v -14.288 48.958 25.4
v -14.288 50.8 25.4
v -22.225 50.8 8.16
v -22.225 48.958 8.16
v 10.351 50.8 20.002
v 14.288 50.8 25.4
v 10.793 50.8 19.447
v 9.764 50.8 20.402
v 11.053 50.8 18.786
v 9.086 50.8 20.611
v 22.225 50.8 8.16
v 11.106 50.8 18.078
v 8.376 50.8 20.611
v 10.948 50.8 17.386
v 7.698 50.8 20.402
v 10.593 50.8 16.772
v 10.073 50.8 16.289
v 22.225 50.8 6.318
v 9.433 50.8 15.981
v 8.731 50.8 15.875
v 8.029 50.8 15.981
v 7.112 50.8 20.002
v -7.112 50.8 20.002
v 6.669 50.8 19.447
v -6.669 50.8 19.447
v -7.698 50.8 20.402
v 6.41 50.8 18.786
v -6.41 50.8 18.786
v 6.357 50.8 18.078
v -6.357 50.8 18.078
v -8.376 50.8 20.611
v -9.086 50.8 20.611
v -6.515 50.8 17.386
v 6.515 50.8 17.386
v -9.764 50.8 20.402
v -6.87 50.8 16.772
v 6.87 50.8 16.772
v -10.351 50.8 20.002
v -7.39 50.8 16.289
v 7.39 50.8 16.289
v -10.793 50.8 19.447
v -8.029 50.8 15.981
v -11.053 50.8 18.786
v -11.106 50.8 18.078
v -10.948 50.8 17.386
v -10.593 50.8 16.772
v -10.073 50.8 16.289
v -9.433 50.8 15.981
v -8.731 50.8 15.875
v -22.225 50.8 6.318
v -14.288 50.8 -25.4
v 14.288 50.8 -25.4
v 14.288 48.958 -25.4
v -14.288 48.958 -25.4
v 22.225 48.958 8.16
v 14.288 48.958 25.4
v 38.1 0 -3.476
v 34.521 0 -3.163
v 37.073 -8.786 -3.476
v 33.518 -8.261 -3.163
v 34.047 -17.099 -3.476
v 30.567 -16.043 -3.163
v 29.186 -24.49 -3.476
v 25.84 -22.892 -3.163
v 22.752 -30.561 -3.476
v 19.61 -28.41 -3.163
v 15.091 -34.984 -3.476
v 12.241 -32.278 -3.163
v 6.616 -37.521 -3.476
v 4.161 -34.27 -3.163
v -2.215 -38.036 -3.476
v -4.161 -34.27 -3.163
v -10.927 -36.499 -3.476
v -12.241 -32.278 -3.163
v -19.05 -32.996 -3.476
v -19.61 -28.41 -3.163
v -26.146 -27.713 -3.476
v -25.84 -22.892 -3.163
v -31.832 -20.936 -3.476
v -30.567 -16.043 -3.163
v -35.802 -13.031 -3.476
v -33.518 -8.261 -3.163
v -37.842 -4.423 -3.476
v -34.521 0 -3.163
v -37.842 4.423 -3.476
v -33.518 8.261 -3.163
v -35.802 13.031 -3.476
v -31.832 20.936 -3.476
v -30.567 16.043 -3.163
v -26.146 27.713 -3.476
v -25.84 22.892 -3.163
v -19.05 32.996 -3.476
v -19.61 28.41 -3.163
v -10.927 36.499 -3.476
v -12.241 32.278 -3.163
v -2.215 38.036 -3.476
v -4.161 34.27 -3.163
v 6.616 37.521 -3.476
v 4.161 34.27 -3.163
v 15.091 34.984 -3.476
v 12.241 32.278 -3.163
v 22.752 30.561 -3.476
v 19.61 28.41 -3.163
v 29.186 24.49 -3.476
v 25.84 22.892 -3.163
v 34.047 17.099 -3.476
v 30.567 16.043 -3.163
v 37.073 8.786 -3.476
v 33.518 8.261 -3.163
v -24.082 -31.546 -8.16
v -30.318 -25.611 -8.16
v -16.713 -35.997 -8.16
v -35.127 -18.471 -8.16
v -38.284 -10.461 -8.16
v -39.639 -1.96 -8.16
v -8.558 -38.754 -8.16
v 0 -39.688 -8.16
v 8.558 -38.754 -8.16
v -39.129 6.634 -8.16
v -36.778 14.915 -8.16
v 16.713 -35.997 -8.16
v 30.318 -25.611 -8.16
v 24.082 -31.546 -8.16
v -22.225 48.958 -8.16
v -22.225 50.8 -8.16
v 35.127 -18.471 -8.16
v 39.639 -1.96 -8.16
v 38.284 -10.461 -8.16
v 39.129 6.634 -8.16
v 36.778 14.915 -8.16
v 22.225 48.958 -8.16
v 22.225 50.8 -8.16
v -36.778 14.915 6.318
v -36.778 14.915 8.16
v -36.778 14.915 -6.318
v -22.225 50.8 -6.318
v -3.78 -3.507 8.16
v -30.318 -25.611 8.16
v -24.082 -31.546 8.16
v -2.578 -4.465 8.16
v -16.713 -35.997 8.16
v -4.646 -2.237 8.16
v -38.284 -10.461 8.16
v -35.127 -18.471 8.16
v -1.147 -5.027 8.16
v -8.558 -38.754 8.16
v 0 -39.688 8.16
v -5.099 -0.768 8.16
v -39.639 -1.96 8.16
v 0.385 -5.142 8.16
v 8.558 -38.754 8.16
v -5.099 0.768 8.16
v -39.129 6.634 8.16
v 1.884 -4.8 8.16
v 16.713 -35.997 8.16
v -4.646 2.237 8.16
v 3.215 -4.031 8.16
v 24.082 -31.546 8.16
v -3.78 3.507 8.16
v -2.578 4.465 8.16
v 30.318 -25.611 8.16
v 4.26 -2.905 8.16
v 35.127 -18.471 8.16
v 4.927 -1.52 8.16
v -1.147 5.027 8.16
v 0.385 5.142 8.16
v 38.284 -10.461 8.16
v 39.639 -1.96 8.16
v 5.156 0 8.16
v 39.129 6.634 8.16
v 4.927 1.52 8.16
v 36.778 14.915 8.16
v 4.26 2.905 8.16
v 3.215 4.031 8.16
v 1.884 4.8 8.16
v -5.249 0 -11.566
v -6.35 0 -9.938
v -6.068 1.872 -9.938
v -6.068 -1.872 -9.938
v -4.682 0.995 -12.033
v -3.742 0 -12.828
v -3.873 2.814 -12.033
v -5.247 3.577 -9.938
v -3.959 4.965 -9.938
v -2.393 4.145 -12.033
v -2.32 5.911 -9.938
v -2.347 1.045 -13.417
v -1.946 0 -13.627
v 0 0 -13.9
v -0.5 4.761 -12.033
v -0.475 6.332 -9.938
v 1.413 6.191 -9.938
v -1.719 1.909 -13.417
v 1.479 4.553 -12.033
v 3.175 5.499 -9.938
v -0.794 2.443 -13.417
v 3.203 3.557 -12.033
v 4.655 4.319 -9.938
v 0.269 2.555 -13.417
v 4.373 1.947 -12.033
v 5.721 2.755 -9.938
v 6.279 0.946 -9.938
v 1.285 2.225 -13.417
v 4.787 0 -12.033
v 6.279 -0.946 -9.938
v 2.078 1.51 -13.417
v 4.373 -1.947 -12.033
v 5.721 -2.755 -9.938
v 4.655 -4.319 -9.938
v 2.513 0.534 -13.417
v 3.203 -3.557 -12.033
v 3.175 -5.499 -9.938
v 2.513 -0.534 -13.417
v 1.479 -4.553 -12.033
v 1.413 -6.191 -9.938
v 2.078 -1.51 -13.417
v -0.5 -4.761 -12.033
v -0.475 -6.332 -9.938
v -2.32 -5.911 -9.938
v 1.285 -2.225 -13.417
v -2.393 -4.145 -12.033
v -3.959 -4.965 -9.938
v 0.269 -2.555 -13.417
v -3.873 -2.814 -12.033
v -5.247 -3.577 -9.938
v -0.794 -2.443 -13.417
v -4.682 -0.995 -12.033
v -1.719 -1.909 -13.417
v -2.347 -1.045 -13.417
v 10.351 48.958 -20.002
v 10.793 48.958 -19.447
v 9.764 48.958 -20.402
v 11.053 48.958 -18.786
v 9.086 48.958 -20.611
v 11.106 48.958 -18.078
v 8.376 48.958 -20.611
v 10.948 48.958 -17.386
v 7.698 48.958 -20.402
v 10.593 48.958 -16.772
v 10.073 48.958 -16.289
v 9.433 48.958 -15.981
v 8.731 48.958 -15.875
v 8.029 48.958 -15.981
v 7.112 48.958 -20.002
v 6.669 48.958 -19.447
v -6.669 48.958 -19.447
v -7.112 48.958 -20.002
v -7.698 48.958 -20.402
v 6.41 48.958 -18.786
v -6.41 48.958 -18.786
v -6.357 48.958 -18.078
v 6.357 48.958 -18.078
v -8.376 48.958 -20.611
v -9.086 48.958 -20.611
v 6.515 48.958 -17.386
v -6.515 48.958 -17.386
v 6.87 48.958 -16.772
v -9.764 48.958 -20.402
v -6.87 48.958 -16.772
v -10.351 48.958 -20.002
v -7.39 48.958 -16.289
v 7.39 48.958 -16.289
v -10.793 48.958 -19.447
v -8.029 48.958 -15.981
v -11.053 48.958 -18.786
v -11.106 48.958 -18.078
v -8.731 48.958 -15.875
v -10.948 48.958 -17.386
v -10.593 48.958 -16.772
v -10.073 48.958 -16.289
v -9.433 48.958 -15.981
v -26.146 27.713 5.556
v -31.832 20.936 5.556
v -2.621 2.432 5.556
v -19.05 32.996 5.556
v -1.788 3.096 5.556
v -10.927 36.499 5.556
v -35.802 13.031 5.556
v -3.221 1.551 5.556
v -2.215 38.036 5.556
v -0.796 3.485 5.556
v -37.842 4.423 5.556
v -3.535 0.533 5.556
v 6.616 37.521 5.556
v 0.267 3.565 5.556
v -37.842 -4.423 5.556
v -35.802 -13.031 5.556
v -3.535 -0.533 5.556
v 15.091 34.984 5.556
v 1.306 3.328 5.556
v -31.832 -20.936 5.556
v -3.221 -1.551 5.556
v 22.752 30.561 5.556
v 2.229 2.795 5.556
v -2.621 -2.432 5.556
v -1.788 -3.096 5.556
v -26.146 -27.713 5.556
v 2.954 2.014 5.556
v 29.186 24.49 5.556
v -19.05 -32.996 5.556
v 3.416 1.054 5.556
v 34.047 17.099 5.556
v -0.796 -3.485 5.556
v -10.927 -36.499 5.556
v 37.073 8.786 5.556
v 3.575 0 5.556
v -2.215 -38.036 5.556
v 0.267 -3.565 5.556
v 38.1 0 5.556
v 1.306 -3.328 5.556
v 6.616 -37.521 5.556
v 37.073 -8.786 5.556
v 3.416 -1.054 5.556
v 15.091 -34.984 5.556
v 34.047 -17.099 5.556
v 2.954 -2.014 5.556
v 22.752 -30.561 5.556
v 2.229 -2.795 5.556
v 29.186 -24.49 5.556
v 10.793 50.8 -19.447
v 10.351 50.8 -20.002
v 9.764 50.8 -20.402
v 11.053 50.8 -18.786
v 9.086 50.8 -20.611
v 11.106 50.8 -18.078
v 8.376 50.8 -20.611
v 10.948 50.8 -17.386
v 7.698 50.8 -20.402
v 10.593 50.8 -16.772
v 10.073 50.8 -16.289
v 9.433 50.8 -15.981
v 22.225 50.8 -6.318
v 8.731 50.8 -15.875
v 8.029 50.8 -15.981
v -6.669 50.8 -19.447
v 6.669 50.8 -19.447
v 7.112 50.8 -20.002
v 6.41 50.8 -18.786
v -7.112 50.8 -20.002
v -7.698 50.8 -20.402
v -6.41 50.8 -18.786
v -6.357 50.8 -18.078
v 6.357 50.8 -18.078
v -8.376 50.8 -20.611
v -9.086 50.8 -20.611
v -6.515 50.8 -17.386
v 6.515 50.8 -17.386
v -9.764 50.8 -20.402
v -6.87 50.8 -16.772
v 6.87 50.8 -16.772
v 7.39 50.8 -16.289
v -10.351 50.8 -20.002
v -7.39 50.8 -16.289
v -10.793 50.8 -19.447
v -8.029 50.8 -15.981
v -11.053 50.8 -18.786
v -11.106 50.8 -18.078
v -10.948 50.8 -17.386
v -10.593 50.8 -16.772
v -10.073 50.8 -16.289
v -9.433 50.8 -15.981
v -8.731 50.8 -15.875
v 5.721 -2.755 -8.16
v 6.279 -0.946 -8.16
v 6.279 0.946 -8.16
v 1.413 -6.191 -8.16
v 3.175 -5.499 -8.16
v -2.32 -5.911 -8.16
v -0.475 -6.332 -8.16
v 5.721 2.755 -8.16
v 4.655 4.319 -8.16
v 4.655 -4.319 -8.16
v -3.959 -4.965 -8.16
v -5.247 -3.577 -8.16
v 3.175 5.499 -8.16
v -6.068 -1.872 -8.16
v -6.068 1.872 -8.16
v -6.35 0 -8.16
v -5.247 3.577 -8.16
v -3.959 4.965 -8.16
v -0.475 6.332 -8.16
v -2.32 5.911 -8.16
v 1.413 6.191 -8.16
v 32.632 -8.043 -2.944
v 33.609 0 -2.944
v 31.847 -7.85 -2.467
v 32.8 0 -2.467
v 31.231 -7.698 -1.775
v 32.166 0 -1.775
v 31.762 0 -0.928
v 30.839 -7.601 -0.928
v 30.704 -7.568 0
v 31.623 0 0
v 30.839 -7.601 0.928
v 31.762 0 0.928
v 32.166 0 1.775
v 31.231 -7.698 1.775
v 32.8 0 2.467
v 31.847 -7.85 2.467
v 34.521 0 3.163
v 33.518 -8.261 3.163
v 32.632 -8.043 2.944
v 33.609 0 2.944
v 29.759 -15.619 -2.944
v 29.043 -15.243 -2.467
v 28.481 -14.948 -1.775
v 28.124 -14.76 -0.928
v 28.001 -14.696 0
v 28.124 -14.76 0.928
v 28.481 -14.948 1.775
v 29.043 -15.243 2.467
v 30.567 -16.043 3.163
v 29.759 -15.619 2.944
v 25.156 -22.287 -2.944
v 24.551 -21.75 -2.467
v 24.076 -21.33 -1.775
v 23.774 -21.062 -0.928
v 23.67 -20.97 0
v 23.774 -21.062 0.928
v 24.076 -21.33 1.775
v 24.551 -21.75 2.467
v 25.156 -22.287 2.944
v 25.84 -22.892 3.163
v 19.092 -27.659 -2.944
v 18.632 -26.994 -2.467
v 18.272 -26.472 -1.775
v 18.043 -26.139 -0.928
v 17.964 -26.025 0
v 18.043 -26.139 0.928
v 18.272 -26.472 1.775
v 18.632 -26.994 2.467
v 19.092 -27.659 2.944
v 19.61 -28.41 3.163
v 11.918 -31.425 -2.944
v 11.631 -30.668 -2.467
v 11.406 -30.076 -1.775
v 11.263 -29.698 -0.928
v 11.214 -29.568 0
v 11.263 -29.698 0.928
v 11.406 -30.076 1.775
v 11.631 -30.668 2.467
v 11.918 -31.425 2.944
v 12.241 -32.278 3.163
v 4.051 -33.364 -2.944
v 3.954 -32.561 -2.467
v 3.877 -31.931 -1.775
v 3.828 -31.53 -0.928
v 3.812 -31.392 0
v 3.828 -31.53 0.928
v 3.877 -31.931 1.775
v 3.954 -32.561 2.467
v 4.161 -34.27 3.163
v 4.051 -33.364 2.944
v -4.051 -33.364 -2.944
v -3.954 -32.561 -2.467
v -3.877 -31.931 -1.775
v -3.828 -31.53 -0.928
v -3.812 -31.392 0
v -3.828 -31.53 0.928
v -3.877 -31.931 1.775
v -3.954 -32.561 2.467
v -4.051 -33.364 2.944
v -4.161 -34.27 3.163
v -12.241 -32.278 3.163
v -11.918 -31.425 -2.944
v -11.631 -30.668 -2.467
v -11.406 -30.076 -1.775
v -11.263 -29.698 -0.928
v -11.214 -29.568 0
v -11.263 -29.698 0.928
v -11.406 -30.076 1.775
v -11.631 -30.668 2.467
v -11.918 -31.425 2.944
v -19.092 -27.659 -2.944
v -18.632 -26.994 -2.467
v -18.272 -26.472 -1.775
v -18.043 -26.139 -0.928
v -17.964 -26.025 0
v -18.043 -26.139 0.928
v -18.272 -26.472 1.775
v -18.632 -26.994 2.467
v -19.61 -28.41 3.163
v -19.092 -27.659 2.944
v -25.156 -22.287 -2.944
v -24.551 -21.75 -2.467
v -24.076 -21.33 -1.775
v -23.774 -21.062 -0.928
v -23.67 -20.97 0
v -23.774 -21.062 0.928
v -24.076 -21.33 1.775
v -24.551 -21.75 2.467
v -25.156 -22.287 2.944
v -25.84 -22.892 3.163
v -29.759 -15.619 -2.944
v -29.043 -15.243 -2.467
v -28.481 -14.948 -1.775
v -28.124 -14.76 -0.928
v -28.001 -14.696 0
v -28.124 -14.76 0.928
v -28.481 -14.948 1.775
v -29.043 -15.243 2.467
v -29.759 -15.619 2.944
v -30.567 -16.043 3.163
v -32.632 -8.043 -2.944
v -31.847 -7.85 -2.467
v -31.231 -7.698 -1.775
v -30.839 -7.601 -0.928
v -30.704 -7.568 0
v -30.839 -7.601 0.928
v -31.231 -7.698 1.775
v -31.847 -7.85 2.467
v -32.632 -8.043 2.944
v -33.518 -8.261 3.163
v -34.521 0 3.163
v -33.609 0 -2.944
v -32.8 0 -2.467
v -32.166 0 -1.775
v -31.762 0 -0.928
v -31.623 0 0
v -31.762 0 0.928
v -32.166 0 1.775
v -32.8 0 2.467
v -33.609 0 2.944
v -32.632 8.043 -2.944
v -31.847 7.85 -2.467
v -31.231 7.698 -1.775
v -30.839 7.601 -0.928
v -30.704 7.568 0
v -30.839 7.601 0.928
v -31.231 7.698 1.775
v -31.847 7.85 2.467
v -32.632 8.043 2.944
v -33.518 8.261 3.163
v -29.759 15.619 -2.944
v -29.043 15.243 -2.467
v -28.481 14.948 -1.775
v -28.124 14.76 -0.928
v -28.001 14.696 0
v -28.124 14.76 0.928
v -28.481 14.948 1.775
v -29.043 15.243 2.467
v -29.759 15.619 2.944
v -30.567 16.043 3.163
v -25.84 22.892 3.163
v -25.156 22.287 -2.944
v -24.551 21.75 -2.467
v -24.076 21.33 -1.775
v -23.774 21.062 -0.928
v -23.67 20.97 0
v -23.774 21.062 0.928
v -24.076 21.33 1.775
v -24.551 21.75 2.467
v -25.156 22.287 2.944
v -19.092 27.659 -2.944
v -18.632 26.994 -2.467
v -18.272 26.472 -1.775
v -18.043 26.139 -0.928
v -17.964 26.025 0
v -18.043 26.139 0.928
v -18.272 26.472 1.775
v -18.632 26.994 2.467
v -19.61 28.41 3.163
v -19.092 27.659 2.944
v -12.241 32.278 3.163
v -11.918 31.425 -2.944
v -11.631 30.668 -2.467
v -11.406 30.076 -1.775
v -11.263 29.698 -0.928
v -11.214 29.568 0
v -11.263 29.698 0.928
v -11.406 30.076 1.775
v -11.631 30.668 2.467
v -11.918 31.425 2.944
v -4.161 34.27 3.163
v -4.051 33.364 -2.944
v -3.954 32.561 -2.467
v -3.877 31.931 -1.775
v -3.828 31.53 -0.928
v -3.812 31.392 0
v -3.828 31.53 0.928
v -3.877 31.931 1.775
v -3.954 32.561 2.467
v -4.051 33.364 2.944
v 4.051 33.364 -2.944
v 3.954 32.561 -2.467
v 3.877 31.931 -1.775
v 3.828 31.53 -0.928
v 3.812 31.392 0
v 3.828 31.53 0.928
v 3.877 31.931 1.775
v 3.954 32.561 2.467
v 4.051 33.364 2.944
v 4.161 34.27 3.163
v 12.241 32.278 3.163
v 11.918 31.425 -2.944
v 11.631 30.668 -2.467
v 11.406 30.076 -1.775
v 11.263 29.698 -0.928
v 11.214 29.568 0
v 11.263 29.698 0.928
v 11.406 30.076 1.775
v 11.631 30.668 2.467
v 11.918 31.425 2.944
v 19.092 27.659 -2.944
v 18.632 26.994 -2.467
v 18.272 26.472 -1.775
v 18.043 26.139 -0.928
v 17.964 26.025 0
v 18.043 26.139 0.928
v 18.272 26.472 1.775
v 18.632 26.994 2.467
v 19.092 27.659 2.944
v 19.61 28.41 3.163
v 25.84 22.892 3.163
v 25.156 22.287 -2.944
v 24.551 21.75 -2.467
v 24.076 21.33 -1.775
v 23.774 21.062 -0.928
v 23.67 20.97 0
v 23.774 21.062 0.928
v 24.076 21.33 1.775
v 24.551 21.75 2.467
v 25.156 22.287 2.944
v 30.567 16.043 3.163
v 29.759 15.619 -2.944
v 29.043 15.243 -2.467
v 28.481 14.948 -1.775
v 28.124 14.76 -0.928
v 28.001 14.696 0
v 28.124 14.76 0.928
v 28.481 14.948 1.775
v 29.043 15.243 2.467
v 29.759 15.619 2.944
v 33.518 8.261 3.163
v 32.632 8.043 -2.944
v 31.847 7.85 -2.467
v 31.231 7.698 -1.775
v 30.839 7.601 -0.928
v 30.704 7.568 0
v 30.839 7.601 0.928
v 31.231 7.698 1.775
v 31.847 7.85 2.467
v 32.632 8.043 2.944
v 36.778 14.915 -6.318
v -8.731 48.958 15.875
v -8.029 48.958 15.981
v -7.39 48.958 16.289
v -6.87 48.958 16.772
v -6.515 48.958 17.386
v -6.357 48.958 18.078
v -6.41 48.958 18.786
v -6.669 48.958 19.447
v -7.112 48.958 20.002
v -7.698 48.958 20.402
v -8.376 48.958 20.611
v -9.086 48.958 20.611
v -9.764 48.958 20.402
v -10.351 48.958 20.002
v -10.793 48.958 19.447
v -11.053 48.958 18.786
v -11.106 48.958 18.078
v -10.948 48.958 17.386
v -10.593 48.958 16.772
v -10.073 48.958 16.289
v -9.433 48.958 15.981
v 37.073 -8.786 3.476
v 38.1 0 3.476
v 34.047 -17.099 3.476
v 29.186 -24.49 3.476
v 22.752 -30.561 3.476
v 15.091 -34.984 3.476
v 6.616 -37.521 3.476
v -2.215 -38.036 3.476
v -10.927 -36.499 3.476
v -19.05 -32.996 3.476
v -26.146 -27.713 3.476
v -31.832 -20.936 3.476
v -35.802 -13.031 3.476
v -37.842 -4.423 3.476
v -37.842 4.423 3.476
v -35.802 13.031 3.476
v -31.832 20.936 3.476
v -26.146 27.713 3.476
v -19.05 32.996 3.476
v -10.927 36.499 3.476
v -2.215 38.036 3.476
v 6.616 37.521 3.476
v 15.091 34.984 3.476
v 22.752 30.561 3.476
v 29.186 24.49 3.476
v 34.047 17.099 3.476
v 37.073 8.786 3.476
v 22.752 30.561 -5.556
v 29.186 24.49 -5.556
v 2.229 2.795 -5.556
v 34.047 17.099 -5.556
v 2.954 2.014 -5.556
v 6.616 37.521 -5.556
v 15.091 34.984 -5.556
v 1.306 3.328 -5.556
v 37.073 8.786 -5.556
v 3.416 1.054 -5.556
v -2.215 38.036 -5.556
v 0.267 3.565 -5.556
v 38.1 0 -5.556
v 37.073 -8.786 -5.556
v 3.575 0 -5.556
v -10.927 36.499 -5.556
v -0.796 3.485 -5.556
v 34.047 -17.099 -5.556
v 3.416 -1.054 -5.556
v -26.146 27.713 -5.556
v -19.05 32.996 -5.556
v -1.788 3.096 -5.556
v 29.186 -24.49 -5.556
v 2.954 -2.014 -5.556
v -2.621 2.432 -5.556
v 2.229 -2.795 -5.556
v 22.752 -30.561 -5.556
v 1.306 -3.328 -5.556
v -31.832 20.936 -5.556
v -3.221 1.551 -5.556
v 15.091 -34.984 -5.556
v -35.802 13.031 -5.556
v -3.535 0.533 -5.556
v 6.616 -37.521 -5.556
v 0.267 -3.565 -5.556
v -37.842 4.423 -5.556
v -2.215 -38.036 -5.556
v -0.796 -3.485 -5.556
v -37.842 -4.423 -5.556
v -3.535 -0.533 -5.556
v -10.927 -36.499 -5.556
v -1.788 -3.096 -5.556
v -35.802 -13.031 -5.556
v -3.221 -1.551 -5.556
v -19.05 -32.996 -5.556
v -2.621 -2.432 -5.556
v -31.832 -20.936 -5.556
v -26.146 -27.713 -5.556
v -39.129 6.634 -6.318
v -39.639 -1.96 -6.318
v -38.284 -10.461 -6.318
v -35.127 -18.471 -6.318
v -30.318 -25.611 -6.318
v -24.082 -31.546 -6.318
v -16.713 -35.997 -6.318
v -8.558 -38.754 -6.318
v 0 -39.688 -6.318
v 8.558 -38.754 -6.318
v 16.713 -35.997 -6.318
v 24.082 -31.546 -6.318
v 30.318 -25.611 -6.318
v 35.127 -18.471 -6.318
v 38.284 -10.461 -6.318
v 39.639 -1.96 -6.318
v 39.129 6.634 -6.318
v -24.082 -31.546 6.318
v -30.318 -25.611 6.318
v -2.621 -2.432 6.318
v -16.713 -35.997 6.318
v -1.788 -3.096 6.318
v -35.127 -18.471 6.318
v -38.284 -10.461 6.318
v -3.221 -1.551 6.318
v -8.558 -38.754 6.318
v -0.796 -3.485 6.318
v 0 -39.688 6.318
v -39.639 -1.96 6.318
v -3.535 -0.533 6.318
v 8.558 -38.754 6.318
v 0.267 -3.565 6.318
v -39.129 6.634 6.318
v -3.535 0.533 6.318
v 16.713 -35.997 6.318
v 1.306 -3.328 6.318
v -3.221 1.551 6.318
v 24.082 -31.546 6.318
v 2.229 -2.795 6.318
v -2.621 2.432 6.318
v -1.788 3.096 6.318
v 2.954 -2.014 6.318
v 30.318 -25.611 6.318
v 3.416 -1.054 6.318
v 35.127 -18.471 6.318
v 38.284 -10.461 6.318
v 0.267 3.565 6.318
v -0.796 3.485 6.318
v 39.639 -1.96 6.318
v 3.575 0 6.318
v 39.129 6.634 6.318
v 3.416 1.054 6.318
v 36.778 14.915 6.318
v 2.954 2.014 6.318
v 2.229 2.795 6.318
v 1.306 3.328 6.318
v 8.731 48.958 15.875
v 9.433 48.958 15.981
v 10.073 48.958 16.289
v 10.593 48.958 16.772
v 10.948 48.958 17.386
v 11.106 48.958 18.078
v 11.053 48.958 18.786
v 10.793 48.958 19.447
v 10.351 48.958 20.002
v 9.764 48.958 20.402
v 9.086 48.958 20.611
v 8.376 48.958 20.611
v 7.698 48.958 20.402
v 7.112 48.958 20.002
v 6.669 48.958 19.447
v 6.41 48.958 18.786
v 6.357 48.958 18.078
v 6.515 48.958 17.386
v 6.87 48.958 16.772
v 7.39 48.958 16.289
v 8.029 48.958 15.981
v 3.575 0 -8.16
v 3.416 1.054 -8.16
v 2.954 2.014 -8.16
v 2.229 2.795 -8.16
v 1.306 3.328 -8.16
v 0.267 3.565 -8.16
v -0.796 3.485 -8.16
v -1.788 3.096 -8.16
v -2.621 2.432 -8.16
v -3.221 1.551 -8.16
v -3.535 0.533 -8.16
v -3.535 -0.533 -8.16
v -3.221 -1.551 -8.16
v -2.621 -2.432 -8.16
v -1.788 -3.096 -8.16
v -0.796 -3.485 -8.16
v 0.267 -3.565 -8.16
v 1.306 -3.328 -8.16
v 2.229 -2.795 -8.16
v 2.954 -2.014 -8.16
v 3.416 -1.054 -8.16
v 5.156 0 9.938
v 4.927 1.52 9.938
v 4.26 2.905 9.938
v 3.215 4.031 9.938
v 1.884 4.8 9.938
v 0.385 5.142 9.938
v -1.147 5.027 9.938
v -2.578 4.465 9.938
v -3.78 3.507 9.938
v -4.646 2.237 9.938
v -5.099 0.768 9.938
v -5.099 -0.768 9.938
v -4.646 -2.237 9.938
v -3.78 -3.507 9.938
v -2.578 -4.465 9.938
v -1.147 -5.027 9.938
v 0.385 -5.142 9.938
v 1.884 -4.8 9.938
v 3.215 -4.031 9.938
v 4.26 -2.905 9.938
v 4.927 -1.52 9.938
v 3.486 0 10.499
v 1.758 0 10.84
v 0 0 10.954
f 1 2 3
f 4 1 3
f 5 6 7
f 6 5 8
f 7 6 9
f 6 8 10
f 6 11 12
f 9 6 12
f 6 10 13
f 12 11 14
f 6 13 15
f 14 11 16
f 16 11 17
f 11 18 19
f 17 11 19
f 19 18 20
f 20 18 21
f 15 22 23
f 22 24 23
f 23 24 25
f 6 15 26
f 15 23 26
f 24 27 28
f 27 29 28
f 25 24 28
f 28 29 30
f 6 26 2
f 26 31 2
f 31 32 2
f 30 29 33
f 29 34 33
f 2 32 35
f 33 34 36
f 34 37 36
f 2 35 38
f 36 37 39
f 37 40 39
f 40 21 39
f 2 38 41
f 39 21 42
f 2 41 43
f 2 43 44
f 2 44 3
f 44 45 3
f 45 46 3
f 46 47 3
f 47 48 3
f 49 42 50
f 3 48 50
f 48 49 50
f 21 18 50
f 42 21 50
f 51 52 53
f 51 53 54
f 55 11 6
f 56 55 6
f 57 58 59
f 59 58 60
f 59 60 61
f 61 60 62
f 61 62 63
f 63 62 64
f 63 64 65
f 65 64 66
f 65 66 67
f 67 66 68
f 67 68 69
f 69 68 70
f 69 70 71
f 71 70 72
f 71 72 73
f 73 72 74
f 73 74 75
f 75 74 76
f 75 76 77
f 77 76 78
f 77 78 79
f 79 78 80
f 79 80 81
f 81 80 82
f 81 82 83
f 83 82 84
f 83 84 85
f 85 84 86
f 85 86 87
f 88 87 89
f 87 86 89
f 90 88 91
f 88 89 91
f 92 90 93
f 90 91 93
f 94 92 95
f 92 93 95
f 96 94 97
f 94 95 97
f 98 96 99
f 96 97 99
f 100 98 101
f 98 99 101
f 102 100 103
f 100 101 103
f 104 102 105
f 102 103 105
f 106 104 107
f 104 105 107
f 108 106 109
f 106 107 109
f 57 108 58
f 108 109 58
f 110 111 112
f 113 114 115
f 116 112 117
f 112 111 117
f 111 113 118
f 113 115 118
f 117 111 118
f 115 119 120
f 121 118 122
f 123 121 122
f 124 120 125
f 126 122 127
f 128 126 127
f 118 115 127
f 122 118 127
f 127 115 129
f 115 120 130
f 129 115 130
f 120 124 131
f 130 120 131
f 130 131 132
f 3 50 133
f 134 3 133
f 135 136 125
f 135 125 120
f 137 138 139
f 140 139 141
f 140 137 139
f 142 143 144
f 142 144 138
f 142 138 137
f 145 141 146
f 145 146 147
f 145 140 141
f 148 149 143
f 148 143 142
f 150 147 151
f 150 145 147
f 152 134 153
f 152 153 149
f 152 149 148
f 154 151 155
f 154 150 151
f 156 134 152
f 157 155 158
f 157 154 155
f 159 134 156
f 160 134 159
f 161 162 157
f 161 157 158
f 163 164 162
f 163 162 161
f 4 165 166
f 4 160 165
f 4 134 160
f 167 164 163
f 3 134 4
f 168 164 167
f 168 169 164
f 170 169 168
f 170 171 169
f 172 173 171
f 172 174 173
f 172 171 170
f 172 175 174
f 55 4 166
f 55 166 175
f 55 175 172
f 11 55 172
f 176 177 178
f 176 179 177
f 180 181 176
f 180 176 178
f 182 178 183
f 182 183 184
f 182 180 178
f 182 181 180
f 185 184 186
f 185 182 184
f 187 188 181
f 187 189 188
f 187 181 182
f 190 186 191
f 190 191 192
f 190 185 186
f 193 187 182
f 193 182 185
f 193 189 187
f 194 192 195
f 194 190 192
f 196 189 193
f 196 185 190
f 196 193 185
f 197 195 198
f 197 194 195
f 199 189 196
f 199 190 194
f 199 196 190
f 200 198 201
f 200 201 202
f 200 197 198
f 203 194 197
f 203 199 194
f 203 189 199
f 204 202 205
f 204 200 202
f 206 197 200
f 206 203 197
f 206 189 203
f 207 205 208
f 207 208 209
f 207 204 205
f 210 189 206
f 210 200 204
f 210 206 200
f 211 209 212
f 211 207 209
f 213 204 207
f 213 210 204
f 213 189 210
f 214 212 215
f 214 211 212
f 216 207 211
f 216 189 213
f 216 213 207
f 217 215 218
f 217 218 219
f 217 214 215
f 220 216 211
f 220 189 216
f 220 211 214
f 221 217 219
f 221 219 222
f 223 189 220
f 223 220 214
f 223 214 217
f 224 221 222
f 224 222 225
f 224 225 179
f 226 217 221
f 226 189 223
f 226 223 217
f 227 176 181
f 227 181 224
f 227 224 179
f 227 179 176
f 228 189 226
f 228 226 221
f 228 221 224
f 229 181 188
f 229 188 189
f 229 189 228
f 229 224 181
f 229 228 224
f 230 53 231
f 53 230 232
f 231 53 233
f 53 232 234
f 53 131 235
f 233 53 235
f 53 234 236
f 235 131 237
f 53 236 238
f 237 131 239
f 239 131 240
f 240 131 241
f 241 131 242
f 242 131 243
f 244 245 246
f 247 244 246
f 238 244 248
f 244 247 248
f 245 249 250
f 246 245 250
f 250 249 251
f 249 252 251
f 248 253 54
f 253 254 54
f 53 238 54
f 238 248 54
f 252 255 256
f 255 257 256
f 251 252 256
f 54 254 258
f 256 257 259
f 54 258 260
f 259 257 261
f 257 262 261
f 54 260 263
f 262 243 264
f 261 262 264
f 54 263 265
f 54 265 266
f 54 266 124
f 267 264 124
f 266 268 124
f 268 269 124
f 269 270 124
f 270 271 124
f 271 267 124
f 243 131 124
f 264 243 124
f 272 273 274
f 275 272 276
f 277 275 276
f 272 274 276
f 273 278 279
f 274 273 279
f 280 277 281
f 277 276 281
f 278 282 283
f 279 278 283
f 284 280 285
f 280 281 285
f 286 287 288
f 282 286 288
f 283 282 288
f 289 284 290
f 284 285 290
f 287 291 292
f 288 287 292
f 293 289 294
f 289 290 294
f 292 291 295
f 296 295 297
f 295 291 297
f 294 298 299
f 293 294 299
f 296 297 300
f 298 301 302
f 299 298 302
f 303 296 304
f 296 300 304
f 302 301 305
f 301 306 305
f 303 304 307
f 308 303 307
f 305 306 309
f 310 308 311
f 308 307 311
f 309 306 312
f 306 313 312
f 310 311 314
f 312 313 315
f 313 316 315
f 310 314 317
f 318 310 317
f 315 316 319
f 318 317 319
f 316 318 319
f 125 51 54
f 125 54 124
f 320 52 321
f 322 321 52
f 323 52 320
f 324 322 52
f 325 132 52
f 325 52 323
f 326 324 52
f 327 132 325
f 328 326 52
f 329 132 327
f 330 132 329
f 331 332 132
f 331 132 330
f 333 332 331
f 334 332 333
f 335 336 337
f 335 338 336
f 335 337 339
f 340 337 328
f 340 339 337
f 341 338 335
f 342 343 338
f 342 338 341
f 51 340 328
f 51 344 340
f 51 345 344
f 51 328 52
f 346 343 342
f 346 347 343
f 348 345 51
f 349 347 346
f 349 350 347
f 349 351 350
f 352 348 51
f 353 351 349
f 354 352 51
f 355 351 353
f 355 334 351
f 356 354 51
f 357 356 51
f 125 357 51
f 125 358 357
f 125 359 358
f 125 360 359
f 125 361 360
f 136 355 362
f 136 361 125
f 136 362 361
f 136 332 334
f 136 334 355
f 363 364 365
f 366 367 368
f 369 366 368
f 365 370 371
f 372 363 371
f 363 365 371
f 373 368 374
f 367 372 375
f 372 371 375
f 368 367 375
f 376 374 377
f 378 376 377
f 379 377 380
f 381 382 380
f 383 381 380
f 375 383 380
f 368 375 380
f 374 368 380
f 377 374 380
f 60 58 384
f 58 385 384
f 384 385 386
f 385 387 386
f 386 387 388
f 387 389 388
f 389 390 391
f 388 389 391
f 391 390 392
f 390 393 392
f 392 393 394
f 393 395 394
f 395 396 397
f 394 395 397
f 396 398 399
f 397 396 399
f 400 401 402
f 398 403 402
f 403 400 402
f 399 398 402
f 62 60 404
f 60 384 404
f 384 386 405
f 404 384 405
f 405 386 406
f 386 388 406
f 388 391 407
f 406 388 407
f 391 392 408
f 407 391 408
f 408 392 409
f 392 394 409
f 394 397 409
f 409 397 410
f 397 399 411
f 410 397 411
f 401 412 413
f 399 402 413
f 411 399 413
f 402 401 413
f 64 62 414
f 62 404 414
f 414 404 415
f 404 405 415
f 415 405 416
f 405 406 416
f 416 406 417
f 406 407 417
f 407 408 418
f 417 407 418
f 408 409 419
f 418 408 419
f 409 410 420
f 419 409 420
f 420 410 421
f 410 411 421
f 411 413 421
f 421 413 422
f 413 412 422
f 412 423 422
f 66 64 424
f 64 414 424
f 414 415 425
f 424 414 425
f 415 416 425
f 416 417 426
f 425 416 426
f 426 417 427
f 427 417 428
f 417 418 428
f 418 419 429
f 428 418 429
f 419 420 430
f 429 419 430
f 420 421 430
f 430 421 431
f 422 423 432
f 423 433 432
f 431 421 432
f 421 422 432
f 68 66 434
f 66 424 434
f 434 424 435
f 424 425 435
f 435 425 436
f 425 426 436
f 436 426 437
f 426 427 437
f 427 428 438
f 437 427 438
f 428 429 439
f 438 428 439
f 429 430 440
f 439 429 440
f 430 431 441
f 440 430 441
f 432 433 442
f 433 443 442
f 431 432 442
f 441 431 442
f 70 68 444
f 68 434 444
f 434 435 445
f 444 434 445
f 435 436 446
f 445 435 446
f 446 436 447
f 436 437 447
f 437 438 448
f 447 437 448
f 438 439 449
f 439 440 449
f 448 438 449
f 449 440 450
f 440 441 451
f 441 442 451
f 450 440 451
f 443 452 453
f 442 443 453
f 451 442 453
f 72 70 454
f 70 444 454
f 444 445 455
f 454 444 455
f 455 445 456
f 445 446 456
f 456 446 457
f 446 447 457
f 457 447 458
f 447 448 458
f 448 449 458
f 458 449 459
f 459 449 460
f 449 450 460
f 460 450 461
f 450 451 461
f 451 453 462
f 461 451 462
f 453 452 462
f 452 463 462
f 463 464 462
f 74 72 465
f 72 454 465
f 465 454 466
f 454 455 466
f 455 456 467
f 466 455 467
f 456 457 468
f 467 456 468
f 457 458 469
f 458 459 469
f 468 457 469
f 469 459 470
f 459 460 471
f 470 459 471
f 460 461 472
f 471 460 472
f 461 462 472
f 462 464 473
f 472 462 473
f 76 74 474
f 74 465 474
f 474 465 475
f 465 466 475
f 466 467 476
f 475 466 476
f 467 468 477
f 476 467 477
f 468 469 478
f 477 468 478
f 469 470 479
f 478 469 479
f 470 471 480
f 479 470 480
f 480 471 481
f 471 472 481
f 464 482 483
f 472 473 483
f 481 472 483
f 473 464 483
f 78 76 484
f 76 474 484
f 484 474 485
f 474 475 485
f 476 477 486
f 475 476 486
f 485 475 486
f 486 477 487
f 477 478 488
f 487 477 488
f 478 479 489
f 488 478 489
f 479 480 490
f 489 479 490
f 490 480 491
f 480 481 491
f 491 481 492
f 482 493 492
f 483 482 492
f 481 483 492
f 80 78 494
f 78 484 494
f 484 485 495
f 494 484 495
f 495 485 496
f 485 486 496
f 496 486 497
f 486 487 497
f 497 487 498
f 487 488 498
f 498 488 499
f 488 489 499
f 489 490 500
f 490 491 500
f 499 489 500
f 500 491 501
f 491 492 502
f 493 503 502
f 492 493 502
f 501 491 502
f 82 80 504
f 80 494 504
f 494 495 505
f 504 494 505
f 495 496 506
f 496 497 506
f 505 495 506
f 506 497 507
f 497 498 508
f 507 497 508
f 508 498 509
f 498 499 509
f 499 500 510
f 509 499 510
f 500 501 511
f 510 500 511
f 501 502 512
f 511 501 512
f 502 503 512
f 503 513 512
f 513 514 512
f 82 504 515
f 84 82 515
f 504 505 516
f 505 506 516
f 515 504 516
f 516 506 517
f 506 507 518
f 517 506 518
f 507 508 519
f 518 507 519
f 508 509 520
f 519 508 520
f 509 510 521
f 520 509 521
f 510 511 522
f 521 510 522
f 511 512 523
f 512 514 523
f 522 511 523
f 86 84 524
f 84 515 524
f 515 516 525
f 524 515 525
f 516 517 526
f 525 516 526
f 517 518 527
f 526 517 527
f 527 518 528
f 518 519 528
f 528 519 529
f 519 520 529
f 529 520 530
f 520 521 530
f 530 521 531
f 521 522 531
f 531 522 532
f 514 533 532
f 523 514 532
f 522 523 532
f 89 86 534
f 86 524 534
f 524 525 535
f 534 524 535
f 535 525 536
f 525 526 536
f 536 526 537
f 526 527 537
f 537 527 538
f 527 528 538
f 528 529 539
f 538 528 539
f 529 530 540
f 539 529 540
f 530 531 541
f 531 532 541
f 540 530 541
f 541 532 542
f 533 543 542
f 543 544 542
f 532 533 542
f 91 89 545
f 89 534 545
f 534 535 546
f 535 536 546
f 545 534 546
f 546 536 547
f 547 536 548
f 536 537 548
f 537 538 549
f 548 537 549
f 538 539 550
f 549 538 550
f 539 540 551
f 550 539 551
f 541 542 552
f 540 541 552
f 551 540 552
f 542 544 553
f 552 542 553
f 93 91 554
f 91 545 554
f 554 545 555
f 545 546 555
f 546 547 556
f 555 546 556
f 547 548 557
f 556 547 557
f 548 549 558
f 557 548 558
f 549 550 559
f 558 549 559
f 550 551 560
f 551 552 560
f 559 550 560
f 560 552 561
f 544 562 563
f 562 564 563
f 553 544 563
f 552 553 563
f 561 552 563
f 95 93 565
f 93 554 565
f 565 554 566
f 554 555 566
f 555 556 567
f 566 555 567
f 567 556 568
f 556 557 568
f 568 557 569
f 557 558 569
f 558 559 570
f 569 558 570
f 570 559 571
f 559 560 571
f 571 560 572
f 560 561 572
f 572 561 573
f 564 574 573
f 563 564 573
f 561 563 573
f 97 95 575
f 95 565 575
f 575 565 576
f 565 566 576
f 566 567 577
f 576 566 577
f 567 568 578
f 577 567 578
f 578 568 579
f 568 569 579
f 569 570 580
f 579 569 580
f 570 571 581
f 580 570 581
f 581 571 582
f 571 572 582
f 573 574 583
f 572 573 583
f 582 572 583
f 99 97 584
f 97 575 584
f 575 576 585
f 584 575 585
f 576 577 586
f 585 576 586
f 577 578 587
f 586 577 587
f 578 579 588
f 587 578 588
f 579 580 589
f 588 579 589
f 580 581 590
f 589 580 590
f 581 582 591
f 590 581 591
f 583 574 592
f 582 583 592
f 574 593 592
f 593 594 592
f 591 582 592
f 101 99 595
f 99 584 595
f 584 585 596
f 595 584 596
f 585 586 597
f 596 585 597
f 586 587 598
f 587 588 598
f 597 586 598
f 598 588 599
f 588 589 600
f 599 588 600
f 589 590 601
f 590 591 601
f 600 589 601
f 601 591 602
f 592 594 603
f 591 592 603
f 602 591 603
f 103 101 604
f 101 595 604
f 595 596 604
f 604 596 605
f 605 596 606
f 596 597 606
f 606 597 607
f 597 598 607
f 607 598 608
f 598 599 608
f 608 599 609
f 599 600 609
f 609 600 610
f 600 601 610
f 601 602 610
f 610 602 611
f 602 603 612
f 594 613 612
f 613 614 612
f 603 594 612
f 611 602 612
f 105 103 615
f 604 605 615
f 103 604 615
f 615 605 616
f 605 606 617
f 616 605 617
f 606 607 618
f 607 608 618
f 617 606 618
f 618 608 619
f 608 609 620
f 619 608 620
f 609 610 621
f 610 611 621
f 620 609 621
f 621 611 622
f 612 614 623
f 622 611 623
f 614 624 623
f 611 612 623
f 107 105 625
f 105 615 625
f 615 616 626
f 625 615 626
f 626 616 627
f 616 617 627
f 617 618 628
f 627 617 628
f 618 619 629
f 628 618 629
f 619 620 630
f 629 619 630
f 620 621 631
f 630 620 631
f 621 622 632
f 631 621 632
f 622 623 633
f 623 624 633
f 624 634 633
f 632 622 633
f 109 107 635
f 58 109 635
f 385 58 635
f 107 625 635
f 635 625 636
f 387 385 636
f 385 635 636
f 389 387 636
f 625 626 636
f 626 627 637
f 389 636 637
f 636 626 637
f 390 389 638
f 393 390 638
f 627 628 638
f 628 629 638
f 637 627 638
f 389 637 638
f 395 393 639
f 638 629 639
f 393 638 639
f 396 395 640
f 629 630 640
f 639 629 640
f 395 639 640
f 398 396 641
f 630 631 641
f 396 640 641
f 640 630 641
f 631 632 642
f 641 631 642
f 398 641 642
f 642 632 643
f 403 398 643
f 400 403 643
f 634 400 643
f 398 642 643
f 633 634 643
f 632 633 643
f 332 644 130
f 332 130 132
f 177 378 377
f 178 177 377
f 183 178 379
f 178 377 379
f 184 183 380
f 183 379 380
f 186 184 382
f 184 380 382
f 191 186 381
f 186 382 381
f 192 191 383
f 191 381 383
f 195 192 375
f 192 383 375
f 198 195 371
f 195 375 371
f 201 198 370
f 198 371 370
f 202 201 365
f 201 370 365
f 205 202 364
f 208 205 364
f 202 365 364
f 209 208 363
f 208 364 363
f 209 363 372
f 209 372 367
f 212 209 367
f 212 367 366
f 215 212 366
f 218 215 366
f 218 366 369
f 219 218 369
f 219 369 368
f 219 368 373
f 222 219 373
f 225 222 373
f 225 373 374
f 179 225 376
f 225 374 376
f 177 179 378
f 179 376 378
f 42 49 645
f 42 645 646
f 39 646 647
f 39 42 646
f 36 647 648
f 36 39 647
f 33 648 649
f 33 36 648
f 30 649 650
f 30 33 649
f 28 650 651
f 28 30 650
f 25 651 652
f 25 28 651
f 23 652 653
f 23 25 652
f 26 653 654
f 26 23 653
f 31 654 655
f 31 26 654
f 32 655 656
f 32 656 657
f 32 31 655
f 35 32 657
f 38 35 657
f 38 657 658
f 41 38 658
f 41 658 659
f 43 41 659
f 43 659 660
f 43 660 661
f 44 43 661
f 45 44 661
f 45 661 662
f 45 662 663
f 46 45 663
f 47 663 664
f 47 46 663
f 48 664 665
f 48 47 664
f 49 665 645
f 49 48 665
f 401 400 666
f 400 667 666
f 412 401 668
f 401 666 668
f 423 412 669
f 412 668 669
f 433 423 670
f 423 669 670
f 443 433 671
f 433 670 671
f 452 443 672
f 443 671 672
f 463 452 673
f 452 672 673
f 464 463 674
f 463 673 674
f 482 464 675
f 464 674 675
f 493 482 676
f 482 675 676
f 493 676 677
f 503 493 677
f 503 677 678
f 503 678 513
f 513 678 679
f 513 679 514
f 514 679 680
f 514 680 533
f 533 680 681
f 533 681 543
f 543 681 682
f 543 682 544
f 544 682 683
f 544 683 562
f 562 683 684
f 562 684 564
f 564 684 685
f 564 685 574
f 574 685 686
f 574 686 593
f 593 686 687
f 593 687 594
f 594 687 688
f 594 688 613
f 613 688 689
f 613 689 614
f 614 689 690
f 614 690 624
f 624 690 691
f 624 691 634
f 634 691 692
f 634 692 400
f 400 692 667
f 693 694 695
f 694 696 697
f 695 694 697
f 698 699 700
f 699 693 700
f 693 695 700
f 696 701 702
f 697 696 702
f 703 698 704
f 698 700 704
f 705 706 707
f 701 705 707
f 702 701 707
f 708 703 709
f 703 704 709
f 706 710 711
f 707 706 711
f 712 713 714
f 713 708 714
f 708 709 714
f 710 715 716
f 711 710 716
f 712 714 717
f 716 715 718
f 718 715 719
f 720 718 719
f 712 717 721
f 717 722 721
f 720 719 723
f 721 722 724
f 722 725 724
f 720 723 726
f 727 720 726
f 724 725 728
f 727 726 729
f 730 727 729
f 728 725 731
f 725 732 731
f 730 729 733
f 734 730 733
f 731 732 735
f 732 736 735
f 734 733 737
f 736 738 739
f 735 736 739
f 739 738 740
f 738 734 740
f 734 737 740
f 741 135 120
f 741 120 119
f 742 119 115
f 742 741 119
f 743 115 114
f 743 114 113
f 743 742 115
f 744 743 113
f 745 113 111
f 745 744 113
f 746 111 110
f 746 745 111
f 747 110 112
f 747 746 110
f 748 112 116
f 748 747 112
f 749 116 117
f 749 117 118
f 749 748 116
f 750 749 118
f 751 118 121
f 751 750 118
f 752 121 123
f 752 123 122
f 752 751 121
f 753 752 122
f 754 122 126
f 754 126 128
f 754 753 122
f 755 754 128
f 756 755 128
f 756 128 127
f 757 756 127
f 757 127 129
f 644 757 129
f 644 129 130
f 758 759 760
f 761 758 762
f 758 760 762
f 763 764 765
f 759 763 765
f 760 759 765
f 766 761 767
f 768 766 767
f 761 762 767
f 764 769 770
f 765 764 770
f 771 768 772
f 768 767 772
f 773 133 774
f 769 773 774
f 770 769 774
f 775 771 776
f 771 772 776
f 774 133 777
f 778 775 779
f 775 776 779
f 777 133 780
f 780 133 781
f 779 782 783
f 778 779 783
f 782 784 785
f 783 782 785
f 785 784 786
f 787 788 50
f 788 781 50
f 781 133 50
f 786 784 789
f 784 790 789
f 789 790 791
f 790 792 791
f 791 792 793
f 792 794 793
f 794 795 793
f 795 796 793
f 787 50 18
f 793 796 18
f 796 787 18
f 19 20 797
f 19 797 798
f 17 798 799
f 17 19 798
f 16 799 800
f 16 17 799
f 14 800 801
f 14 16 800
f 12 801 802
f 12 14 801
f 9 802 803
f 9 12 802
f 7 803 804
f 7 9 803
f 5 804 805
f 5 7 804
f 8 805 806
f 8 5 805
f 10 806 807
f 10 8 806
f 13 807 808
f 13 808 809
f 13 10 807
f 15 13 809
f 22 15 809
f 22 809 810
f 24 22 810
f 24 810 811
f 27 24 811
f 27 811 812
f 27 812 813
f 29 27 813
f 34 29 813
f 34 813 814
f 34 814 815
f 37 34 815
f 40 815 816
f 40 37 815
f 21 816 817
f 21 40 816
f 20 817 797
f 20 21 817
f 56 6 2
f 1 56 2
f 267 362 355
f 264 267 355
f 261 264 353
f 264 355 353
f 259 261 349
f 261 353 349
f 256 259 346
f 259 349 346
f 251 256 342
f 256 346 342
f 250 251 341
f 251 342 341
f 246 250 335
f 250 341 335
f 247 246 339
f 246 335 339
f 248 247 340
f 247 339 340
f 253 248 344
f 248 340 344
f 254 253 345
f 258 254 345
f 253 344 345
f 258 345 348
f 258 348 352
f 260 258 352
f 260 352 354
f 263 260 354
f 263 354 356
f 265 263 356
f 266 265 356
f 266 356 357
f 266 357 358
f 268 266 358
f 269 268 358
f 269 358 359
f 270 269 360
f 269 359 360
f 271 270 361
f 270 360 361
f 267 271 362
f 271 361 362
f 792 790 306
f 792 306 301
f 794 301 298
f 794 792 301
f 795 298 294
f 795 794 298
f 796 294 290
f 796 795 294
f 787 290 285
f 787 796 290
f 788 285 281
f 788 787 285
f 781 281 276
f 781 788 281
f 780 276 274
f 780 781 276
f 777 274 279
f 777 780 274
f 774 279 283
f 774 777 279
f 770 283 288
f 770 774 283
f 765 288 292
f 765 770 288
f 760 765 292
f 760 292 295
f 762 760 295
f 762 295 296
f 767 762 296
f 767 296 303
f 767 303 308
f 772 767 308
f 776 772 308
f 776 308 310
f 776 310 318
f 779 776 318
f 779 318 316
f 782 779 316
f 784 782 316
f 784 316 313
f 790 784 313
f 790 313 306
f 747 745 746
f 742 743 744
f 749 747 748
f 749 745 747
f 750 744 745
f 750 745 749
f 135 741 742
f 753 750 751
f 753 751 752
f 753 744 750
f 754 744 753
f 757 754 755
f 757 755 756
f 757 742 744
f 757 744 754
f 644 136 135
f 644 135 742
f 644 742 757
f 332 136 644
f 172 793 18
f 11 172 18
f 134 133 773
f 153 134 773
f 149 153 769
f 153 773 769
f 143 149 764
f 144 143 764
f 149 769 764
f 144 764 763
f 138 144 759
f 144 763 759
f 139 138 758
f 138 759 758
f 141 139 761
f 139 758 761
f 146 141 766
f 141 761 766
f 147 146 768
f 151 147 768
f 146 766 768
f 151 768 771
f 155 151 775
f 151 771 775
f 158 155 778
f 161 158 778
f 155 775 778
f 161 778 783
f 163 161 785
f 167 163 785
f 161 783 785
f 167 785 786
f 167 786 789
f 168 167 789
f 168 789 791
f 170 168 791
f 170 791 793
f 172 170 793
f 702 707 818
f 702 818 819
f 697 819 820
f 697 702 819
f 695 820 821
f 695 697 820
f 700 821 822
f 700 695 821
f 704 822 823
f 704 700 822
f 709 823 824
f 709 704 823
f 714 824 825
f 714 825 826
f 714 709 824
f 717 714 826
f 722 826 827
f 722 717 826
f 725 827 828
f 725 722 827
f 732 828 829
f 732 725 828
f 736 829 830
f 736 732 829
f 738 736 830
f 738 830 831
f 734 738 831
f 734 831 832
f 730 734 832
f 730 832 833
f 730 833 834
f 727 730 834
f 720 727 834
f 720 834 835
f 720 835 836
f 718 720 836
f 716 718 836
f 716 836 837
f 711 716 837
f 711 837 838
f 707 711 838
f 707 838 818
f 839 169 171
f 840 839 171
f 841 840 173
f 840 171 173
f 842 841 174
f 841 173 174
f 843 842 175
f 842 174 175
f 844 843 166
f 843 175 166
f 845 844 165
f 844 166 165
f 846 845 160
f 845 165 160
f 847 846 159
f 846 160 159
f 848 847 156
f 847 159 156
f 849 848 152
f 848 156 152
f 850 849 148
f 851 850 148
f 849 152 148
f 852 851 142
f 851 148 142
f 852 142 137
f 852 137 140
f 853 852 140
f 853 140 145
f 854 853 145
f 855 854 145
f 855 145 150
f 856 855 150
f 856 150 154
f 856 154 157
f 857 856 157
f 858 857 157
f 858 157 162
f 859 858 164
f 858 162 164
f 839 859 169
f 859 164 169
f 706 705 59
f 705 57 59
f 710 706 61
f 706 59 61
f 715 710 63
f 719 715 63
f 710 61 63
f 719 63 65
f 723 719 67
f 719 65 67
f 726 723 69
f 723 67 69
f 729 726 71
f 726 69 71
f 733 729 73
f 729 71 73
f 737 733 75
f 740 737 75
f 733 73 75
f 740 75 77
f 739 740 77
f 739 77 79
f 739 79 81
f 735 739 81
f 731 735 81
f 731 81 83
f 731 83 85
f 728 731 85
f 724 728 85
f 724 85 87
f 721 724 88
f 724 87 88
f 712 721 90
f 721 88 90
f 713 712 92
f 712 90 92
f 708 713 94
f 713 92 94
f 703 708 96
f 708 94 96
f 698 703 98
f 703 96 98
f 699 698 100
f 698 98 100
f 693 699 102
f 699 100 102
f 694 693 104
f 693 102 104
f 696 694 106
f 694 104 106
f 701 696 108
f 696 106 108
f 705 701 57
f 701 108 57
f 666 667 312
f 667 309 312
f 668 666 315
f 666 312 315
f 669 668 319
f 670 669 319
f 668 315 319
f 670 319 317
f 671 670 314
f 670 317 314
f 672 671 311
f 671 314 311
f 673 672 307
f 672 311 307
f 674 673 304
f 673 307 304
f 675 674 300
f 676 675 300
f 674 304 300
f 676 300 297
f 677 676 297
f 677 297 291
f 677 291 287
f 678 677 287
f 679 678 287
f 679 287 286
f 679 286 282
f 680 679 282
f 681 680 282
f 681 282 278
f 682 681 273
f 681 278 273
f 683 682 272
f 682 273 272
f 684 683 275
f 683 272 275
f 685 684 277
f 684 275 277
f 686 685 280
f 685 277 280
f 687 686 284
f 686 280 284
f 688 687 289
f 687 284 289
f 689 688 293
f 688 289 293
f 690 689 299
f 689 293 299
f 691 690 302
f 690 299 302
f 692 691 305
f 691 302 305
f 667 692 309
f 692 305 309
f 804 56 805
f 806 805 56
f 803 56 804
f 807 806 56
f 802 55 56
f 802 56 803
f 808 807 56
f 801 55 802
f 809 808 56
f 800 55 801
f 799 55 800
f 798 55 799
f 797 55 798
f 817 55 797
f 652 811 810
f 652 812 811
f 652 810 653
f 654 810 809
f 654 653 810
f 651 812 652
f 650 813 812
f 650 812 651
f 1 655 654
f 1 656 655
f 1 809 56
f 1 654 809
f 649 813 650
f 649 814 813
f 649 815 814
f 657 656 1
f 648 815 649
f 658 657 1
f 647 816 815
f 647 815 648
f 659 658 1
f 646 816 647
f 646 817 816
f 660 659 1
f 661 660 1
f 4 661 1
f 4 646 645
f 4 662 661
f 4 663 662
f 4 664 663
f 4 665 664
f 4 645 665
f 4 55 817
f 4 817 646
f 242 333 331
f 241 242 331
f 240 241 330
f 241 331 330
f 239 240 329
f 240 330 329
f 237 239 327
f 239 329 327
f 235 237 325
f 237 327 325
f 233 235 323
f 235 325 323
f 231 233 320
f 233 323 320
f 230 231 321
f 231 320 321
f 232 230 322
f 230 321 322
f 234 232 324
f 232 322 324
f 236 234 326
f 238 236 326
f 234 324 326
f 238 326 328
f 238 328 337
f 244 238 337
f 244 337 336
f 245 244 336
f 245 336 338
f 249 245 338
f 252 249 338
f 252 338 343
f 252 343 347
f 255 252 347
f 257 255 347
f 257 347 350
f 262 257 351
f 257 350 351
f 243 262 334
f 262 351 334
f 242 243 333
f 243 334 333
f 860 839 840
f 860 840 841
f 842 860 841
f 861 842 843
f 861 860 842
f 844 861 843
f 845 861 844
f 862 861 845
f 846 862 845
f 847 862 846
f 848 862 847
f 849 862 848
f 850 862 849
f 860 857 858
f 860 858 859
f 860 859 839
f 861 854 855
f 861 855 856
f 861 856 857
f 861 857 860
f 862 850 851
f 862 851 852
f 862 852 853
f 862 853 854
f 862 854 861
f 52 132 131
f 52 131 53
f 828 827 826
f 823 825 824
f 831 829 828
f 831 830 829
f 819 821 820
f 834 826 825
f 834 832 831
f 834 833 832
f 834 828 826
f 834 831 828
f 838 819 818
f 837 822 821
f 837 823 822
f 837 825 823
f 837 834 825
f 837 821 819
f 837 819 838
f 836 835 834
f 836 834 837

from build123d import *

# Parameters (mm, degrees)
BOSS_EXTRUDE1_DEPTH = 1.8415
SKETCH5_R           = 2.38125
BOSS_EXTRUDE2_DEPTH = 1.8415
SKETCH6_R           = 5.1562
BOSS_EXTRUDE3_DEPTH = 1.778
DOME4_FACE_RADIUS   = 5.1562
DOME4_HEIGHT        = 1.016
SKETCH8_R           = 6.35
BOSS_EXTRUDE4_DEPTH = 1.778
DOME7_FACE_RADIUS   = 6.35
DOME7_HEIGHT        = 3.9624
BOSS_EXTRUDE5_REACH = 74.677
SKETCH9_R           = 3.57505


with BuildPart() as part:
    # Sketch3 → Revolve1 (revolve)
    with BuildSketch(Plane(origin=(0, 0, 0), x_dir=(0, 0, -1), z_dir=(1, 0, 0)), mode=Mode.PRIVATE) as revolve1_sk:
        with BuildLine():
            Line((-5.55625, 38.1), (-5.55625, 0))
            Line((-5.55625, 0), (5.55625, 0))
            Line((5.55625, 0), (5.55625, 38.1))
            Line((5.55625, 38.1), (3.476015551, 38.1))
            Line((3.476015551, 38.1), (3.162918166, 34.521280517))
            ThreePointArc((3.162918166, 34.521280517), (0, 31.623), (-3.162918166, 34.521280517))
            Line((-3.162918166, 34.521280517), (-3.476015551, 38.1))
            Line((-3.476015551, 38.1), (-5.55625, 38.1))
        make_face()
    revolve(revolve1_sk.sketch.rotate(Axis((0, 0, 5.55625), (0, 0, -1)), 90), axis=Axis((0, 0, 5.55625), (0, 0, -1)))



with BuildPart() as body_2:
    # Sketch4 → Boss-Extrude1 (new body)
    with BuildSketch(Plane.XY.offset(6.31825)):
        with BuildLine():
            Line((22.225, 50.8), (-22.225, 50.8))
            Line((-22.225, 50.8), (-36.778077648, 14.915450404))
            ThreePointArc((-36.778077648, 14.915450404), (0, -39.6875), (36.778077648, 14.915450404))
            Line((36.778077648, 14.915450404), (22.225, 50.8))
        make_face()
    extrude(amount=BOSS_EXTRUDE1_DEPTH)

    # Sketch5 → Boss-Extrude2 (add)
    with BuildSketch(Plane(origin=(0, 50.8, 97.5995), x_dir=(-1, 0, 0), z_dir=(0, -1, 0))):
        Polygon((-14.2875, 72.1995), (14.2875, 72.1995), (22.225, 89.43975), (-22.225, 89.43975), align=None)
        with Locations(Location((-8.73125, 79.34325, 0), (0, 0, 90))):
            Circle(SKETCH5_R, mode=Mode.SUBTRACT)
        with Locations(Location((8.73125, 79.34325, 0), (0, 0, 90))):
            Circle(SKETCH5_R, mode=Mode.SUBTRACT)
    extrude(amount=BOSS_EXTRUDE2_DEPTH)


with BuildPart() as body_3:
    # Mirror1: mirrored copy
    add(body_2.part.mirror(Plane.XY))


with BuildPart() as body_2_1:
    add(body_2.part)

    # Sketch6 → Boss-Extrude3 (add)
    with BuildSketch(Plane.XY.offset(8.15975)):
        Circle(SKETCH6_R)
    extrude(amount=BOSS_EXTRUDE3_DEPTH)

    # Dome4: a dome of height H over a round flat face of radius A is a cap of a sphere of radius (A * A + H * H) / (2 * H)
    dome4_r = (DOME4_FACE_RADIUS * DOME4_FACE_RADIUS + DOME4_HEIGHT * DOME4_HEIGHT) / (2 * DOME4_HEIGHT)
    dome4_base = Plane((0, 0, 9.93775), z_dir=(0, 0, 1))
    with Locations(dome4_base.offset(DOME4_HEIGHT - dome4_r)):
        dome4_ball = Sphere(dome4_r, mode=Mode.PRIVATE)
    add(split(dome4_ball, bisect_by=dome4_base, keep=Keep.TOP, mode=Mode.PRIVATE))


with BuildPart() as body_4:
    # Sketch8 → Boss-Extrude4 (new body)
    with BuildSketch(Plane(origin=(0, 0, -8.15975), x_dir=(-1, 0, 0), z_dir=(0, 0, -1))):
        Circle(SKETCH8_R)
    extrude(amount=BOSS_EXTRUDE4_DEPTH)

    # Dome7: a dome of height H over a round flat face of radius A is a cap of a sphere of radius (A * A + H * H) / (2 * H)
    dome7_r = (DOME7_FACE_RADIUS * DOME7_FACE_RADIUS + DOME7_HEIGHT * DOME7_HEIGHT) / (2 * DOME7_HEIGHT)
    dome7_base = Plane((0, 0, -9.93775), z_dir=(0, 0, -1))
    with Locations(dome7_base.offset(DOME7_HEIGHT - dome7_r)):
        dome7_ball = Sphere(dome7_r, mode=Mode.PRIVATE)
    add(split(dome7_ball, bisect_by=dome7_base, keep=Keep.TOP, mode=Mode.PRIVATE))


with BuildPart() as part_1:
    add(part.part)

    # Boss-Extrude5: up to this face of the body (flat: up to its plane)
    boss_extrude5_end = Plane(body_3.part.faces().sort_by_distance((0, 5.154216825, -8.15975))[0])
    # Sketch9 → Boss-Extrude5 (add, up to the picked face)
    with BuildSketch(Plane.XY.offset(8.15975), mode=Mode.PRIVATE) as boss_extrude5_sk1:
        Circle(SKETCH9_R)
    boss_extrude5_tool1 = split(extrude(boss_extrude5_sk1.sketch, amount=-BOSS_EXTRUDE5_REACH, mode=Mode.PRIVATE), bisect_by=boss_extrude5_end, keep=Keep.BOTH, mode=Mode.PRIVATE)

    add(body_2_1.part)  # Boss-Extrude5 merges body 2
    add(boss_extrude5_tool1.solids().sort_by(Axis((0, 0, 8.15975), (0, 0, -1)))[0])


solid = Compound([body_3.part, body_4.part, part_1.part])
